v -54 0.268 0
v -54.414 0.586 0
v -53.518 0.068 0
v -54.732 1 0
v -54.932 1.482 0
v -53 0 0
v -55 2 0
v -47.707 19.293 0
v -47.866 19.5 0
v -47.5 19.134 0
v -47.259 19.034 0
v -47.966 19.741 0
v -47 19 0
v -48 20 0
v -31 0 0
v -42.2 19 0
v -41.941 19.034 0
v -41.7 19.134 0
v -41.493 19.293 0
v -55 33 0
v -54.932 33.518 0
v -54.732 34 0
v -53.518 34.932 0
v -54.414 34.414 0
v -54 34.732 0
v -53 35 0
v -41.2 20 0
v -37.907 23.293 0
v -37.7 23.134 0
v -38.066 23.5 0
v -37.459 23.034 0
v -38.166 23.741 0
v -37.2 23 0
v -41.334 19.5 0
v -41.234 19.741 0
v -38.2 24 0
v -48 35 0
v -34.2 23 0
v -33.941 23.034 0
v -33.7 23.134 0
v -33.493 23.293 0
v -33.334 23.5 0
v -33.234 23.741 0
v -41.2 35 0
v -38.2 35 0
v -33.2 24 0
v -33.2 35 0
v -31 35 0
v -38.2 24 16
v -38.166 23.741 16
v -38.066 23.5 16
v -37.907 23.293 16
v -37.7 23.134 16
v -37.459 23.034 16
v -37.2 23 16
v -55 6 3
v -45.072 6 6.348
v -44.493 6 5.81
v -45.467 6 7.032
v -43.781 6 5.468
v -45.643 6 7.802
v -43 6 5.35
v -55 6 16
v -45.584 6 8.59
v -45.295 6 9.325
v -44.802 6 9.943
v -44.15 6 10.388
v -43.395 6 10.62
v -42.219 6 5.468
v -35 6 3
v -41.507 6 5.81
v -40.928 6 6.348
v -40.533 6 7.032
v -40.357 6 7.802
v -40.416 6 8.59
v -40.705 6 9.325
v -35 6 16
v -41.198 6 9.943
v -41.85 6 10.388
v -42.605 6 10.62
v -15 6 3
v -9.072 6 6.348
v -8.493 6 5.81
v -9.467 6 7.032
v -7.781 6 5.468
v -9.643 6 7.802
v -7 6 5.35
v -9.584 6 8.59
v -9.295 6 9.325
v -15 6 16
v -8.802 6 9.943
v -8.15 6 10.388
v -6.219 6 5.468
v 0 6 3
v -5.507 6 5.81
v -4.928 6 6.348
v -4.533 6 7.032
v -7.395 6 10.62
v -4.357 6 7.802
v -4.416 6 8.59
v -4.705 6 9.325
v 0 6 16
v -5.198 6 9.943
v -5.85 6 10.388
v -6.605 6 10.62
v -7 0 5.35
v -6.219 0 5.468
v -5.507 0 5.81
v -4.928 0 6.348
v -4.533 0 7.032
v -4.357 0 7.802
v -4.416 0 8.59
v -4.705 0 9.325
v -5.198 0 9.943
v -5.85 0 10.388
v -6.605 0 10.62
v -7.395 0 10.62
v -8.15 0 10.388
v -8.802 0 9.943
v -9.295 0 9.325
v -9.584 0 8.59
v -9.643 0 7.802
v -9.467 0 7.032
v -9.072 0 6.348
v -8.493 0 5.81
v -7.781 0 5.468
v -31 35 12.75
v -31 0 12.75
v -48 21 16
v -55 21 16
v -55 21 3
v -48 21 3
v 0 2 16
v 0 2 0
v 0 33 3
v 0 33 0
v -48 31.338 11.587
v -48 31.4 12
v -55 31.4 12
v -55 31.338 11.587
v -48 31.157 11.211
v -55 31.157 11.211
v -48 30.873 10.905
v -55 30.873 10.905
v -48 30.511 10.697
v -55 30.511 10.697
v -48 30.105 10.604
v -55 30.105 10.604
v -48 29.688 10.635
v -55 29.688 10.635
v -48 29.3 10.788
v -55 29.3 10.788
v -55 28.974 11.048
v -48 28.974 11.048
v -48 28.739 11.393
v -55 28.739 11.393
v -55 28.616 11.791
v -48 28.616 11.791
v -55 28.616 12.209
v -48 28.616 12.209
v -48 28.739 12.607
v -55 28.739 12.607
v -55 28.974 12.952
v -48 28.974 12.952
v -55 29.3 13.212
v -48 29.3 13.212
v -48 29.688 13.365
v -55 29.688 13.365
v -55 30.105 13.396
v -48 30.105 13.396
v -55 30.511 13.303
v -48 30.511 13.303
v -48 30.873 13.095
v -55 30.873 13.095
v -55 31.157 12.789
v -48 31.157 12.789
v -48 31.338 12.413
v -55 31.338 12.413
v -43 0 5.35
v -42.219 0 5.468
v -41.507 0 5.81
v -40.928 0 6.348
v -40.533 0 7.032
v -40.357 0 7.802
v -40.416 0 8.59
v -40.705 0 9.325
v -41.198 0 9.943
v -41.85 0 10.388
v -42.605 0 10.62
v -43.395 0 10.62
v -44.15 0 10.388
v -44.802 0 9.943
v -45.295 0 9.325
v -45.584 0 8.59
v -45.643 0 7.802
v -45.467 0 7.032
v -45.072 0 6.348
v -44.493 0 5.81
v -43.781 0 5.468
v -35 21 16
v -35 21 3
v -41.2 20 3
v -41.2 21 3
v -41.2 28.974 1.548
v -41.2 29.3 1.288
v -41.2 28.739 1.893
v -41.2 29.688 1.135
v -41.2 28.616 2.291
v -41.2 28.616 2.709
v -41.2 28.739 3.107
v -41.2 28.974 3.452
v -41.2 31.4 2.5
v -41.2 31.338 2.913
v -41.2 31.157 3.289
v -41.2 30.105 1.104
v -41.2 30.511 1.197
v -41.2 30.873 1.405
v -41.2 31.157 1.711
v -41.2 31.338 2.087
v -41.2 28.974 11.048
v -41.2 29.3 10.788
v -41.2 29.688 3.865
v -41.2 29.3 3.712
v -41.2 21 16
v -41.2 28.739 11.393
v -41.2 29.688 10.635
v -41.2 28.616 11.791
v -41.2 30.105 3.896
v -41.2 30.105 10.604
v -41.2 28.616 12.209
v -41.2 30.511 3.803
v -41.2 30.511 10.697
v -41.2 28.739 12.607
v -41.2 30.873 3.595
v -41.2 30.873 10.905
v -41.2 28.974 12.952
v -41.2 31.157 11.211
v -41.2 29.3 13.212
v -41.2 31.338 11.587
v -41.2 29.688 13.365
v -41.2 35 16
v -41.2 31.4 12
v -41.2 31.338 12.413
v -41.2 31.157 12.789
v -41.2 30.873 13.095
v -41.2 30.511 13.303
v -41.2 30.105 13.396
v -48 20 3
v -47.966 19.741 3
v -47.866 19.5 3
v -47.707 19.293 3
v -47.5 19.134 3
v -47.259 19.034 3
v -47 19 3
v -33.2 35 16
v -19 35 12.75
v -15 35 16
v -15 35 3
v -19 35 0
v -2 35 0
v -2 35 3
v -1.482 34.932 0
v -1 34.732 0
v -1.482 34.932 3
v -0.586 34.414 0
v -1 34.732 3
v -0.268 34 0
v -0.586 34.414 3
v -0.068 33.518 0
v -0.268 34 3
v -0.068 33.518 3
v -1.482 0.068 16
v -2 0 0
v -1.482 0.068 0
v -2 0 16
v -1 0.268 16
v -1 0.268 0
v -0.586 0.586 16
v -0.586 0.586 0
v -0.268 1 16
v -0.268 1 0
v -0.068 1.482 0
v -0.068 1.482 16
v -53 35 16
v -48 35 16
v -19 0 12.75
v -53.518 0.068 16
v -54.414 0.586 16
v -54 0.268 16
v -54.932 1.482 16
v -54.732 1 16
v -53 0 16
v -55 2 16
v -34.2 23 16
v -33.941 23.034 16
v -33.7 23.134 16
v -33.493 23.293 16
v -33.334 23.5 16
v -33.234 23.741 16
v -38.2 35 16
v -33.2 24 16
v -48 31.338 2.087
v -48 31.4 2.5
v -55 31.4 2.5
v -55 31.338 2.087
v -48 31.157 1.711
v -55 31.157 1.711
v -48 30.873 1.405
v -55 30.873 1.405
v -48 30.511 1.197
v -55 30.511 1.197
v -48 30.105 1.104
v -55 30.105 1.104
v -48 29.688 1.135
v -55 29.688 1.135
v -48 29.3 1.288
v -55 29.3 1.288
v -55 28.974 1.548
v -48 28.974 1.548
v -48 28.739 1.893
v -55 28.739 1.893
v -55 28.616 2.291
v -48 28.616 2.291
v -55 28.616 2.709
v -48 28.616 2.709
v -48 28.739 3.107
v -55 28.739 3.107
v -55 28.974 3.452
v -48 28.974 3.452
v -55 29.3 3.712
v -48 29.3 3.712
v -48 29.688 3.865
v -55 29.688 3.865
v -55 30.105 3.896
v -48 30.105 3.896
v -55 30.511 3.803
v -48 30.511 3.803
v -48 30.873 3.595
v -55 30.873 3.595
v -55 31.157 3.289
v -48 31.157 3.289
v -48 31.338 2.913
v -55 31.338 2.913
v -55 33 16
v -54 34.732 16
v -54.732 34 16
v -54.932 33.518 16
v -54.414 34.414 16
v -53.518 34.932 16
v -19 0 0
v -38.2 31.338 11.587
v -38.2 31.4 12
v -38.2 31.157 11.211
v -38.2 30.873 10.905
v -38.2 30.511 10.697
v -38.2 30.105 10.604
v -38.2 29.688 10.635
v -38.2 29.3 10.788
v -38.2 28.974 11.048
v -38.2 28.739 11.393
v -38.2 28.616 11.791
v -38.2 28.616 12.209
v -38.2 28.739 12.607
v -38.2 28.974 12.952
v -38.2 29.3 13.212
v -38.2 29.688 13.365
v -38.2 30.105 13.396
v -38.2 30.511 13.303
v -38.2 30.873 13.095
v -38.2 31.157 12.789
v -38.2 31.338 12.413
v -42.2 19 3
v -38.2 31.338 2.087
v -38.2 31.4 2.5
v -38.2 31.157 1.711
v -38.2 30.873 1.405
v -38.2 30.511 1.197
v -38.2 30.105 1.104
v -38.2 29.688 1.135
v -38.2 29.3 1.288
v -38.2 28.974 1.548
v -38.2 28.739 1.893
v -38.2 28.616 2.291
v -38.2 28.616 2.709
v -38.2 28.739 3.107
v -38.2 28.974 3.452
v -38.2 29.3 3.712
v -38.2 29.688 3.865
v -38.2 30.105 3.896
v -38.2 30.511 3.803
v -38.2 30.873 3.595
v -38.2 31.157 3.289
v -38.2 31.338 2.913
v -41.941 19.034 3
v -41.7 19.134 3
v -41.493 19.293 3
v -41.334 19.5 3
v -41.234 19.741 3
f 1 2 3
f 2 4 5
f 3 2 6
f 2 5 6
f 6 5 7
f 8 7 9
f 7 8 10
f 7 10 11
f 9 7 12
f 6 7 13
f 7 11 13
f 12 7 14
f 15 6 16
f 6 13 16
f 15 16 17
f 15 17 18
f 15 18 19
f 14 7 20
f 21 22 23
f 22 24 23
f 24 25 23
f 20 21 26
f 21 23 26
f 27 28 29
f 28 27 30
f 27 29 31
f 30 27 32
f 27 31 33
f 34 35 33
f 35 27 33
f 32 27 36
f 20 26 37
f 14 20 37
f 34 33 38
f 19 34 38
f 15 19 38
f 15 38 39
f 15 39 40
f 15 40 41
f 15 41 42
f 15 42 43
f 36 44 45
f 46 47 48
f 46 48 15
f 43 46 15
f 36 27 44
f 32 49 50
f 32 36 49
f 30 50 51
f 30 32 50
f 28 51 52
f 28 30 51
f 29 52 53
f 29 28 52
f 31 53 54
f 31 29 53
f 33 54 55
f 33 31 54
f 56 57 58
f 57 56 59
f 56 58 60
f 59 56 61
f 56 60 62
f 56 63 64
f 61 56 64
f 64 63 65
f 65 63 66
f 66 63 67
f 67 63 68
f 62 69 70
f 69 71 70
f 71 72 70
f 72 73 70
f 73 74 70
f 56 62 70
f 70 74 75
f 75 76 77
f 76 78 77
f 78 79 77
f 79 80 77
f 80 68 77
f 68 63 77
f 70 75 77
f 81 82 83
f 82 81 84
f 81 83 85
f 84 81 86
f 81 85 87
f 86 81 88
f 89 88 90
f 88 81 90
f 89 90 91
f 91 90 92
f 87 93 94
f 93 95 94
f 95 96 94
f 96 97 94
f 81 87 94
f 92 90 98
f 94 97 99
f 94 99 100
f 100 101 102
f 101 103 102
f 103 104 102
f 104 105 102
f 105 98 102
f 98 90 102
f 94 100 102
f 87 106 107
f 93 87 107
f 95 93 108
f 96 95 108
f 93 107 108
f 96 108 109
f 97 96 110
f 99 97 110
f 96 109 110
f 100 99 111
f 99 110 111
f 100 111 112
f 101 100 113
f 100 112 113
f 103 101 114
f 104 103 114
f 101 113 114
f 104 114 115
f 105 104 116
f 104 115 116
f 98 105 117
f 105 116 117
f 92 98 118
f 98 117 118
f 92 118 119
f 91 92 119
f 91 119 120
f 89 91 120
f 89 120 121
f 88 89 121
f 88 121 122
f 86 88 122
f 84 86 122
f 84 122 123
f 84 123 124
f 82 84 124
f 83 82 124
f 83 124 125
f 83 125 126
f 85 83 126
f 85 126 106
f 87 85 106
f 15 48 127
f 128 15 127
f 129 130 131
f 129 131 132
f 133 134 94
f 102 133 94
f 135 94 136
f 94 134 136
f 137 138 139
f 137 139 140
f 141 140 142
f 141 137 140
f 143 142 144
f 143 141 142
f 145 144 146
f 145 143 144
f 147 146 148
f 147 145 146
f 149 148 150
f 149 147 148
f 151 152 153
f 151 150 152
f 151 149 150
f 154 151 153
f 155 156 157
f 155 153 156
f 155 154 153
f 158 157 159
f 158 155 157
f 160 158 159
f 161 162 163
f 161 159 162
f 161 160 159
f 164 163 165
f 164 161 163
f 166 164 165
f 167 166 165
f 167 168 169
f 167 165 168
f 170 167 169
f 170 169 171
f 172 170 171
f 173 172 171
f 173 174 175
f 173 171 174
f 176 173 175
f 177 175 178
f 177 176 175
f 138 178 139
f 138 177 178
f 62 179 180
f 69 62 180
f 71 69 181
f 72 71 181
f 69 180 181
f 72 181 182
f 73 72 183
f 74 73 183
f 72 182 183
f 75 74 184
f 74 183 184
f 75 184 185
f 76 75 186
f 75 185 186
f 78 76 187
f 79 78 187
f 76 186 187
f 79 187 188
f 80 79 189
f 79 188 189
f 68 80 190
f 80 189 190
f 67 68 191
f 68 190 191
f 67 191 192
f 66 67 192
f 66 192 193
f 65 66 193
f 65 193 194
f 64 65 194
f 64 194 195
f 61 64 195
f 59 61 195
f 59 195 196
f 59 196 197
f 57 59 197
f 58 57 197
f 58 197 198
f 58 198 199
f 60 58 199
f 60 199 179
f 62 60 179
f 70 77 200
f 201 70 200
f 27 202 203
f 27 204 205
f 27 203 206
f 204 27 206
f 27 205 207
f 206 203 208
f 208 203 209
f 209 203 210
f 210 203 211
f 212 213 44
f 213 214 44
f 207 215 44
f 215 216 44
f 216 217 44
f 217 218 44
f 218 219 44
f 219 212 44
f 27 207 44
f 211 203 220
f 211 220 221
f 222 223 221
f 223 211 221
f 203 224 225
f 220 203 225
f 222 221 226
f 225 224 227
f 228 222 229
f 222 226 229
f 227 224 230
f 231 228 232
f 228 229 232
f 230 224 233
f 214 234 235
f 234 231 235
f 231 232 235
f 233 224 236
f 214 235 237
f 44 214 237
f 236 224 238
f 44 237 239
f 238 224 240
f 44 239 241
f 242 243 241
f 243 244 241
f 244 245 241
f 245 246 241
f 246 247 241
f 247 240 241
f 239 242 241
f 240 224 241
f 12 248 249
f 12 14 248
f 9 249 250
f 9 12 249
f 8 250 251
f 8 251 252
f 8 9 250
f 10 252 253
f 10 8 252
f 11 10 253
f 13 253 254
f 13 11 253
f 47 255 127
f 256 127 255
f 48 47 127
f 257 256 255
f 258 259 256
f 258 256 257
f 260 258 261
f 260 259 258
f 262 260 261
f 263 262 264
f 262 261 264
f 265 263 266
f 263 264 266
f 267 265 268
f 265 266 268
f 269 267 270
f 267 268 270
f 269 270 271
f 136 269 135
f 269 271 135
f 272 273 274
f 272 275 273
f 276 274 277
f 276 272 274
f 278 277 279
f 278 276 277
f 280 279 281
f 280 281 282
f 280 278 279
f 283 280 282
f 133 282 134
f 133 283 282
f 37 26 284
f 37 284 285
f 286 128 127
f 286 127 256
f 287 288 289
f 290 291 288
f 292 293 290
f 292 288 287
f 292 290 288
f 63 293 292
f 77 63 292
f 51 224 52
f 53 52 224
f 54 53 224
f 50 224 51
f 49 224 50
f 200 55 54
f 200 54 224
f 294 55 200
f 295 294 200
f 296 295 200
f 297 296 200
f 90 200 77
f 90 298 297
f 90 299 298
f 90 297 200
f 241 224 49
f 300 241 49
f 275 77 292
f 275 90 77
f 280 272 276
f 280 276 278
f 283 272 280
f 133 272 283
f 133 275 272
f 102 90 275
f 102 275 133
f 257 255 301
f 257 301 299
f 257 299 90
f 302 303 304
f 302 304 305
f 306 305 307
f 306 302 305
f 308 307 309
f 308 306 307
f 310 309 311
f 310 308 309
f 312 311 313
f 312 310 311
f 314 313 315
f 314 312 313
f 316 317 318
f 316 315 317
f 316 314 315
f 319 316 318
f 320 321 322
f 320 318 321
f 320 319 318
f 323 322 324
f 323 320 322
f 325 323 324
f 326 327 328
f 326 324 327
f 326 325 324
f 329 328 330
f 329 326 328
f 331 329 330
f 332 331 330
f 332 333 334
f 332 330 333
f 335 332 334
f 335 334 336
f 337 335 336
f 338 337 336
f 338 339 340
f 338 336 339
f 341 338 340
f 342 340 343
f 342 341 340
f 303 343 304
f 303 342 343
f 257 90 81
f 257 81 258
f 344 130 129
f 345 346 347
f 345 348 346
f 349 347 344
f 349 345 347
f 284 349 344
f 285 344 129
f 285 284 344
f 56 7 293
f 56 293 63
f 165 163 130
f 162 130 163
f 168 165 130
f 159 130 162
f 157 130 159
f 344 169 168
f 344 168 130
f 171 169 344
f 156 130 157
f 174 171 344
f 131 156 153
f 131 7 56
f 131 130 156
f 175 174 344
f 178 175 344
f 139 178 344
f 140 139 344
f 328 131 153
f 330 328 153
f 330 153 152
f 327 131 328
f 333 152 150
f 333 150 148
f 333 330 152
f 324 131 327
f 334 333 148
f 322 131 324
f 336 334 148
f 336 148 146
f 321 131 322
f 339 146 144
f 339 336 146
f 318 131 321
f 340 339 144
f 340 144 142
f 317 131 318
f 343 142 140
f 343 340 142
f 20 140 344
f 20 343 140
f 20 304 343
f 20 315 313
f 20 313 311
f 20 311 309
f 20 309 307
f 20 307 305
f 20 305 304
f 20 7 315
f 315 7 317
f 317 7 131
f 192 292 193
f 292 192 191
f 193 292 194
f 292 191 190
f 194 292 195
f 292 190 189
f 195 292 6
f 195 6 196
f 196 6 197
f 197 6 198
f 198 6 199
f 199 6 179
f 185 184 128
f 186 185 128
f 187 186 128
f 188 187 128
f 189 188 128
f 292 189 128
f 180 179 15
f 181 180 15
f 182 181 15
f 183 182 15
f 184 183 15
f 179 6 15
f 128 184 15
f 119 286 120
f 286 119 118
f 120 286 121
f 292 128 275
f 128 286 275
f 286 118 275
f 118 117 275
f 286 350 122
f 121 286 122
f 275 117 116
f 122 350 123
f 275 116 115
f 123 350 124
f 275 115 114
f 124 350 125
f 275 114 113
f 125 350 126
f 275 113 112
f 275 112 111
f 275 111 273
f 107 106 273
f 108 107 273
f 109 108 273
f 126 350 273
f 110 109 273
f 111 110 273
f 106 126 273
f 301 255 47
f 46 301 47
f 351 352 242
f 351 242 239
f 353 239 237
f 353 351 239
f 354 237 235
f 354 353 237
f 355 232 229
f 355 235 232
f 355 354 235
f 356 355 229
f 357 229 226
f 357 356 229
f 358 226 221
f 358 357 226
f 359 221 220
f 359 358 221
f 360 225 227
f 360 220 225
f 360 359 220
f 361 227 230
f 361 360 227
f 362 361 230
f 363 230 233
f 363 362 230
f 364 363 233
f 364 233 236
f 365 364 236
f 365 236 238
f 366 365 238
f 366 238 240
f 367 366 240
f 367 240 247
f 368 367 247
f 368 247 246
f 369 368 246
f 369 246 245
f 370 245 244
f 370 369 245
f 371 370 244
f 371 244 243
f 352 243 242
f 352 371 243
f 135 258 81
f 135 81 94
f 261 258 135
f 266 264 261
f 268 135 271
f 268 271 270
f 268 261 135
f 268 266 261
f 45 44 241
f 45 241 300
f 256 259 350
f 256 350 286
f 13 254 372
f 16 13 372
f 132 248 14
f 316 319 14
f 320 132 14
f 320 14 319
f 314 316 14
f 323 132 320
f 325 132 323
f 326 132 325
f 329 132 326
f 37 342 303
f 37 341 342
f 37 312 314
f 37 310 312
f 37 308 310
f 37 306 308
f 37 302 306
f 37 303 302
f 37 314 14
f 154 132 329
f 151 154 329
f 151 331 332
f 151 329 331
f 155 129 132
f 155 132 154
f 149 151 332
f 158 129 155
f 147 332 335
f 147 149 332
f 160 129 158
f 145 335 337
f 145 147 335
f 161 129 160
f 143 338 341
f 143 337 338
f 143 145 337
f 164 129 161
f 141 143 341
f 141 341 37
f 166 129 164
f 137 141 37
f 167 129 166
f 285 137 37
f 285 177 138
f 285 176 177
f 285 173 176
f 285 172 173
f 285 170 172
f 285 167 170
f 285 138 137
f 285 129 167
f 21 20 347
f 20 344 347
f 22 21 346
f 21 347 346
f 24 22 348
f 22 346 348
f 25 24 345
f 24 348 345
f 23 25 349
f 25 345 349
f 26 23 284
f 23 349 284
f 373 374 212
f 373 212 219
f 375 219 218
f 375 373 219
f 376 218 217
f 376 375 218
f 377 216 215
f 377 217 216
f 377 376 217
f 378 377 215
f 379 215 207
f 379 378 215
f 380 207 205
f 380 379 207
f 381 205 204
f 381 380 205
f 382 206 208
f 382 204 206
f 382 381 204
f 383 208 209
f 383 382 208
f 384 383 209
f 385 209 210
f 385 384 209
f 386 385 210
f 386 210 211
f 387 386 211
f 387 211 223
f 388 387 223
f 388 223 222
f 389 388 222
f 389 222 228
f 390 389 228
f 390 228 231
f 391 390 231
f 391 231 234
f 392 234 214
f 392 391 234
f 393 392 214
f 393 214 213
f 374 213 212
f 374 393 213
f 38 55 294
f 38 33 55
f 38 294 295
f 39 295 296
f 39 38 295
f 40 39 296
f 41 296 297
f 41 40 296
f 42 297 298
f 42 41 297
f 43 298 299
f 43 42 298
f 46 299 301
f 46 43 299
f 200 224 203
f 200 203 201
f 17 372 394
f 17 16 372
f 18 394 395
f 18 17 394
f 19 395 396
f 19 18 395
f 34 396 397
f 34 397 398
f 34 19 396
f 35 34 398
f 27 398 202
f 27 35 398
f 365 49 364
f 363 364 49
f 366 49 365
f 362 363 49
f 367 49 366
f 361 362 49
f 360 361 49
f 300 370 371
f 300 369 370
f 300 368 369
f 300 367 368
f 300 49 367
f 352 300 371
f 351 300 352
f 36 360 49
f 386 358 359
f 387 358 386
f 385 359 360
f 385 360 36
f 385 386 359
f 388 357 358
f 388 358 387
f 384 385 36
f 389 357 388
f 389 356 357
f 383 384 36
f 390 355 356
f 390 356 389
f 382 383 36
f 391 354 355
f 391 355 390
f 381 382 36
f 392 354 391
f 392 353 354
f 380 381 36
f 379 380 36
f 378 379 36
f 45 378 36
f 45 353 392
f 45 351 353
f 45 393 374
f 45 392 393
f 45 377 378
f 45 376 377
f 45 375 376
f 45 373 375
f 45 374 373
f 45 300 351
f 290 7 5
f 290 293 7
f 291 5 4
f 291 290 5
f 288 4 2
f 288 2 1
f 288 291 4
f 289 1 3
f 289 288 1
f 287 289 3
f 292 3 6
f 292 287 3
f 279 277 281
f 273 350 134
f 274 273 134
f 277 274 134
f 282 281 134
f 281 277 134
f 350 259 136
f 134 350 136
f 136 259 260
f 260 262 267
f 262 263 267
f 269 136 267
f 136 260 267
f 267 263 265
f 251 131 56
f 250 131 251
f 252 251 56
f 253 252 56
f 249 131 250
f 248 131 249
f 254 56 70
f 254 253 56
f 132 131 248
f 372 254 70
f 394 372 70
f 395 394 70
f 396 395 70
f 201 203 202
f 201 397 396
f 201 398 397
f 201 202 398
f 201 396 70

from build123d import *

# Parameters (mm, degrees)
SKETCH_1_W               = 55
SKETCH_1_H               = 35
EXTRUDE_1_DEPTH          = 16
SKETCH_3_R               = 2.65
CUT_EXTRUDE_2_DEPTH      = 13
SKETCH_4_W               = 12
SKETCH_4_H               = 12.75
CUT_EXTRUDE_3_DEPTH      = 68.126745787
FILLET_1_R               = 2
CUT_EXTRUDE_9_DEPTH      = 68.126745787
CUT_EXTRUDE_9_DEPTH_BACK = 18
SKETCH_11_R              = 1.4
SKETCH_12_W              = 6.8
SKETCH_12_H              = 16
CUT_EXTRUDE_10_DEPTH     = 68.126745787
SKETCH_13_W              = 15
SKETCH_13_H              = 15
SKETCH_13_W_2            = 20
CUT_EXTRUDE_12_DEPTH     = 13
SKETCH_15_W              = 20.5473163
SKETCH_15_H              = 18.952912532
CUT_EXTRUDE_13_DEPTH     = 13
SKETCH_16_W              = 5
SKETCH_16_H              = 16
CUT_EXTRUDE_14_DEPTH     = 12
FILLET_3_R               = 1


with BuildPart() as part:
    # 草图1 → 凸台-拉伸1 (new body)
    with BuildSketch(Plane.XY):
        with Locations((-27.5, 17.5)):
            Rectangle(SKETCH_1_W, SKETCH_1_H)
    extrude(amount=EXTRUDE_1_DEPTH)

    # 草图3 → 切除-拉伸2 (cut)
    with BuildSketch(Plane.XZ):
        with Locations(Location((-43, 8, 0), (0, 0, 270))):
            Circle(SKETCH_3_R)
        with Locations(Location((-7, 8, 0), (0, 0, 270))):
            Circle(SKETCH_3_R)
    extrude(amount=-CUT_EXTRUDE_2_DEPTH, mode=Mode.SUBTRACT)

    # 草图4 → 切除-拉伸3 (cut, through all)
    with BuildSketch(Plane.XZ):
        with Locations((-25, 6.375)):
            Rectangle(SKETCH_4_W, SKETCH_4_H)
    extrude(amount=-CUT_EXTRUDE_3_DEPTH, mode=Mode.SUBTRACT)

    # 圆角1
    fillet_1_edges = [part.edges().sort_by_distance(p)[0] for p in [
        (-55, 35, 8),
        (0, 35, 8),
        (0, 0, 8),
        (-55, 0, 8),
    ]]
    fillet(fillet_1_edges, radius=FILLET_1_R)

    # 草图11 → 切除-拉伸9 (cut, two sides: drawn at the far end of the back side and taken through both)
    with BuildSketch(Plane.ZY.offset(55).offset(-CUT_EXTRUDE_9_DEPTH_BACK)):
        with Locations(Location((12, 30, 0), (0, 0, 90))):
            Circle(SKETCH_11_R)
        with Locations(Location((2.5, 30, 0), (0, 0, 90))):
            Circle(SKETCH_11_R)
    extrude(amount=CUT_EXTRUDE_9_DEPTH + CUT_EXTRUDE_9_DEPTH_BACK, mode=Mode.SUBTRACT)

    # 草图12 → 切除-拉伸10 (cut, through all)
    with BuildSketch(Plane.XY.offset(16)):
        with Locations((-44.6, 27)):
            Rectangle(SKETCH_12_W, SKETCH_12_H)
    extrude(amount=-CUT_EXTRUDE_10_DEPTH, mode=Mode.SUBTRACT)

    # 草图13 → 切除-拉伸12 (cut)
    with BuildSketch(Plane.XY.offset(16)):
        with Locations((-7.5, 13.5)):
            Rectangle(SKETCH_13_W, SKETCH_13_H)
        with Locations((-45, 13.5)):
            Rectangle(SKETCH_13_W_2, SKETCH_13_H)
    extrude(amount=-CUT_EXTRUDE_12_DEPTH, mode=Mode.SUBTRACT)

    # 草图15 → 切除-拉伸13 (cut)
    with BuildSketch(Plane.XY.offset(16)):
        with Locations((-4.72634185, 30.476456266)):
            Rectangle(SKETCH_15_W, SKETCH_15_H)
    extrude(amount=-CUT_EXTRUDE_13_DEPTH, mode=Mode.SUBTRACT)

    # 草图16 → 切除-拉伸14 (cut)
    with BuildSketch(Plane(origin=(0, 35, 0), x_dir=(1, 0, 0), z_dir=(0, 1, 0))):
        with Locations((-35.7, -8)):
            Rectangle(SKETCH_16_W, SKETCH_16_H)
    extrude(amount=-CUT_EXTRUDE_14_DEPTH, mode=Mode.SUBTRACT)

    # 圆角3
    fillet_3_edges = [part.edges().sort_by_distance(p)[0] for p in [
        (-38.2, 23, 8),
        (-33.2, 23, 8),
        (-48, 19, 1.5),
        (-41.2, 19, 1.5),
    ]]
    fillet(fillet_3_edges, radius=FILLET_3_R)


solid = part.part
